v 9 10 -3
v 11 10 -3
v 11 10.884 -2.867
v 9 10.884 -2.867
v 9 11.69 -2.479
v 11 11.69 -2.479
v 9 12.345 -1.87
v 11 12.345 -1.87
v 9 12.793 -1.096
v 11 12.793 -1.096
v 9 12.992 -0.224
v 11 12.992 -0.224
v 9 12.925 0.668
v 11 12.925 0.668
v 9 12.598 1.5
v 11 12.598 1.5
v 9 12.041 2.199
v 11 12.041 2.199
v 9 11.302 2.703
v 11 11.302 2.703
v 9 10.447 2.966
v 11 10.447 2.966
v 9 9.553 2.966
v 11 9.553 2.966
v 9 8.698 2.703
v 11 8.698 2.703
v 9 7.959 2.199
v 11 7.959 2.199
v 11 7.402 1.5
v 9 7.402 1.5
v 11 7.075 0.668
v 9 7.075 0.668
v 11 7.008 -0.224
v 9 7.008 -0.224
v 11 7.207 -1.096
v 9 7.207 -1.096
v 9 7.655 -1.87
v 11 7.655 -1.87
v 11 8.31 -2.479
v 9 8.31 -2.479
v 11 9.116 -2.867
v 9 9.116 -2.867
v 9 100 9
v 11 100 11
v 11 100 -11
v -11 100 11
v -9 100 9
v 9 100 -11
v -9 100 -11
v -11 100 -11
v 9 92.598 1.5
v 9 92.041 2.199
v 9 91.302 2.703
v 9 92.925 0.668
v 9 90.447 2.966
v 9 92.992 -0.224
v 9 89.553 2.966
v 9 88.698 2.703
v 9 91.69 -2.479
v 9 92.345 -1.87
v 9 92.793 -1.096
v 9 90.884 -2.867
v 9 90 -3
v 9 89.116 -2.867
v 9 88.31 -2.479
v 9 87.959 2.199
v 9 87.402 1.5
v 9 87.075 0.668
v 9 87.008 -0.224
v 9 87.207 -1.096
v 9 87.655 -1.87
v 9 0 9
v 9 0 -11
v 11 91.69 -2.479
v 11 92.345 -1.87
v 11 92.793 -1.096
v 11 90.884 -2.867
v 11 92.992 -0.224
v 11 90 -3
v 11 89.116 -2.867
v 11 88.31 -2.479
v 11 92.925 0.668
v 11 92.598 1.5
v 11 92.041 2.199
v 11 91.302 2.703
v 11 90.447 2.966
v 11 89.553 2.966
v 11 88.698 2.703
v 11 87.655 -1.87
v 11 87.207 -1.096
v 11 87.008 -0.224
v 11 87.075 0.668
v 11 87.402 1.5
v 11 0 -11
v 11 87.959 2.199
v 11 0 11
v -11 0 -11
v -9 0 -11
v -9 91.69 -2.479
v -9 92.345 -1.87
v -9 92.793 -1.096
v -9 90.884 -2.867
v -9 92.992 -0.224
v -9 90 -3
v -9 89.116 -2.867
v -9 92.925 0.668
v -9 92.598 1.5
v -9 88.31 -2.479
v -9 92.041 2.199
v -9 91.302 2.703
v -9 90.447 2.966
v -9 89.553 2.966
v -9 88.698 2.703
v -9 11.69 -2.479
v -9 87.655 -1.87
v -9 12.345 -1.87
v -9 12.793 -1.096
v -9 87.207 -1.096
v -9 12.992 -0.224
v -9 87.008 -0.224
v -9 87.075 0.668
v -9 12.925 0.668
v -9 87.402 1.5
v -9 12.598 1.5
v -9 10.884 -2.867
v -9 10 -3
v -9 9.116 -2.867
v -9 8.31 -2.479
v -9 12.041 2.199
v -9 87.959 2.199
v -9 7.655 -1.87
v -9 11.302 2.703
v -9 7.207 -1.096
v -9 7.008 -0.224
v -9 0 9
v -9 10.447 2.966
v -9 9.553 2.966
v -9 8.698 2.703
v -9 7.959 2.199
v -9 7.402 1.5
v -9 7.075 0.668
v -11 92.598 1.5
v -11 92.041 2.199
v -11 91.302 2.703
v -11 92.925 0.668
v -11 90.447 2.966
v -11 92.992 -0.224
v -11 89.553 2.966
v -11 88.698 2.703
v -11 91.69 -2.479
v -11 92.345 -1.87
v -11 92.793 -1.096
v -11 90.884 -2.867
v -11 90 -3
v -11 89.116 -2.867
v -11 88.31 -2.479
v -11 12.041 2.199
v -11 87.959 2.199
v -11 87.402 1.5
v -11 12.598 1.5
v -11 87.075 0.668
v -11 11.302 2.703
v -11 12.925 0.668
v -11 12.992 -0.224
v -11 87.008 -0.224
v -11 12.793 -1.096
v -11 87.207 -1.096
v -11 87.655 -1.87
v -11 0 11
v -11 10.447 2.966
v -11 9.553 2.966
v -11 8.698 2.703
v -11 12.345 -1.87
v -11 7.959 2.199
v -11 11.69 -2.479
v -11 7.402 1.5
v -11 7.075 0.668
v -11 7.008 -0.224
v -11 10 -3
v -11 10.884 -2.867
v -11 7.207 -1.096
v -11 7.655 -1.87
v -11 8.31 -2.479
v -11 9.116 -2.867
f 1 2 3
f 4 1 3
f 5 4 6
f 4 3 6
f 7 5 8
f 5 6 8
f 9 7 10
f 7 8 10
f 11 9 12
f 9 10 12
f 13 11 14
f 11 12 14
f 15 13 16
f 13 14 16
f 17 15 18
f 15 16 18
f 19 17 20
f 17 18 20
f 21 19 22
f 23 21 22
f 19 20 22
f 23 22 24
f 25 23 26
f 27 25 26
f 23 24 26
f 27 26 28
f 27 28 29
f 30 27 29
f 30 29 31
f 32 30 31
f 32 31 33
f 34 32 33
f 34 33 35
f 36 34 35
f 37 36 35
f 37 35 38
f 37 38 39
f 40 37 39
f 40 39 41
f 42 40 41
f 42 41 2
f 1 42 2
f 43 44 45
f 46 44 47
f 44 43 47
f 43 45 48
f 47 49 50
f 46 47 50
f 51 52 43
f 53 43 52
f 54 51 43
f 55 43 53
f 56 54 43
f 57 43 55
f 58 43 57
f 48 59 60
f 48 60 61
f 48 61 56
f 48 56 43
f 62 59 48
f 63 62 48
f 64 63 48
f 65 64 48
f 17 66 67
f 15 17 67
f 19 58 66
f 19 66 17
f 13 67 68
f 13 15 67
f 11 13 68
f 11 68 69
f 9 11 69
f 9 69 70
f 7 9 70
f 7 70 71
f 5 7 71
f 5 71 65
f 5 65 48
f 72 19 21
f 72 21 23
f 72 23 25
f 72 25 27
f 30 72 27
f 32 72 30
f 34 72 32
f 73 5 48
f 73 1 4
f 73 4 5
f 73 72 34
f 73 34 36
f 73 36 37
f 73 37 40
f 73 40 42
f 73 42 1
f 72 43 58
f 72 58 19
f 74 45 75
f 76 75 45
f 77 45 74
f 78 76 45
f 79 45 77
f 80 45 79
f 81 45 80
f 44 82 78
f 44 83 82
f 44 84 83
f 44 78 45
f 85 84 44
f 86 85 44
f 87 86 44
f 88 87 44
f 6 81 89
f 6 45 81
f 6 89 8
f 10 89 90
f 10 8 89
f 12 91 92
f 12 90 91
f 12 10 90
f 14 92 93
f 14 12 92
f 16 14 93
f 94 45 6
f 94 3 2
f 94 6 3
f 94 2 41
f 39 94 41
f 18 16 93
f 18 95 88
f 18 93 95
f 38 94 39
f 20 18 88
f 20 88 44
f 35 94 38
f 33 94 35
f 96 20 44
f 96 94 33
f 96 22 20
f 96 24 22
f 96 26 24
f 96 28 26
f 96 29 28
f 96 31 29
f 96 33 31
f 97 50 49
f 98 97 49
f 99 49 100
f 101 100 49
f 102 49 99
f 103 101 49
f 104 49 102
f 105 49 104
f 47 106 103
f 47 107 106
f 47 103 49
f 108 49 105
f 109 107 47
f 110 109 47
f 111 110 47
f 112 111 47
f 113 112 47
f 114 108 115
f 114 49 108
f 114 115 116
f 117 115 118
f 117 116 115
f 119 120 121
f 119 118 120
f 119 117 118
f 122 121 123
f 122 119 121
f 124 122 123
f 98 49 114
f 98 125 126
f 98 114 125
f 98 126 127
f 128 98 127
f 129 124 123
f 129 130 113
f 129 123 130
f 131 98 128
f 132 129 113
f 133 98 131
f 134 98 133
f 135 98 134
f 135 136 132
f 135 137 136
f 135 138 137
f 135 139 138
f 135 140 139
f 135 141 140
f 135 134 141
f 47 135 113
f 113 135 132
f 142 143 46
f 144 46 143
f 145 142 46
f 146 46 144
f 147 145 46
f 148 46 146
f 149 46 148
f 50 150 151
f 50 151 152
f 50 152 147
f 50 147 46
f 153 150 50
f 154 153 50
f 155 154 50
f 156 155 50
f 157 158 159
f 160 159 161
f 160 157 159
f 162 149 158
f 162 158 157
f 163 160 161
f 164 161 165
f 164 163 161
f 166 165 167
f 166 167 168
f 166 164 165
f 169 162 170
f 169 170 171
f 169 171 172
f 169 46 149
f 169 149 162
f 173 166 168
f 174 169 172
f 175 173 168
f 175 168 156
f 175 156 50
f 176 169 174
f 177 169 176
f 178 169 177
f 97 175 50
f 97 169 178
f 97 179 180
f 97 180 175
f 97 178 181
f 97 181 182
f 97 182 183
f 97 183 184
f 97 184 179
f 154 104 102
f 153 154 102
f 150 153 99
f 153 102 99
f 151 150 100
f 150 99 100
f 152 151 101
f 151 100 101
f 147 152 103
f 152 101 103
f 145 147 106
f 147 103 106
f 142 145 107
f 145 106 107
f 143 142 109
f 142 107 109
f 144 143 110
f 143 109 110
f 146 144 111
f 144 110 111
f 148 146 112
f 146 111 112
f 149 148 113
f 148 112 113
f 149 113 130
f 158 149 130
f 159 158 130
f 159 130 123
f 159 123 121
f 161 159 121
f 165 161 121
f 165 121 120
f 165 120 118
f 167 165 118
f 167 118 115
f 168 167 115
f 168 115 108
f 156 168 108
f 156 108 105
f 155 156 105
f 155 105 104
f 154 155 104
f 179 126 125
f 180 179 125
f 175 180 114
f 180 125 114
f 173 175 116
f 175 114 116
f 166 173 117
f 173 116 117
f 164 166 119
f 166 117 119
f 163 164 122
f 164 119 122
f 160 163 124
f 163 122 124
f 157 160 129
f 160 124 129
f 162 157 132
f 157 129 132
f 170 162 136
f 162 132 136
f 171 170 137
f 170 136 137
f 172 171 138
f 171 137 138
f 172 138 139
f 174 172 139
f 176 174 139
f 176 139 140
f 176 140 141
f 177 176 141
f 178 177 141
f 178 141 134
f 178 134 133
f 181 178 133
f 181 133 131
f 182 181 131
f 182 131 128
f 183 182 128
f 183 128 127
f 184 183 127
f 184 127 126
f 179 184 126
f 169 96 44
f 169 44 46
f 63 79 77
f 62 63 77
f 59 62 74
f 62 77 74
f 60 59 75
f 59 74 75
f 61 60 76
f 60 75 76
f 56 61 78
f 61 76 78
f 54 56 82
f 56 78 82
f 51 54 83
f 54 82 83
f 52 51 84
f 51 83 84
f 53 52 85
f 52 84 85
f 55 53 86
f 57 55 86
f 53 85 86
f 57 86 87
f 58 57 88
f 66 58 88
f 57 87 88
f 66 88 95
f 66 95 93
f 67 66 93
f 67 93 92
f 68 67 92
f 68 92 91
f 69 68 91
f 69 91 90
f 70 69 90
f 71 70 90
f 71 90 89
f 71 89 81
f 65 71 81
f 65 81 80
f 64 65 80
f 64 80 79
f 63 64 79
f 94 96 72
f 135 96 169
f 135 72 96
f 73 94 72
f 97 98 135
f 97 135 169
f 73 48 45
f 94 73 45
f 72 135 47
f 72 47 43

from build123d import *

# Parameters (mm, degrees)
SALIENTE_EXTRUIR1_DEPTH = 100
CROQUIS2_R              = 3
CORTAR_EXTRUIR1_DEPTH   = 100
CROQUIS3_R              = 3
CORTAR_EXTRUIR2_DEPTH   = 103.980580694


with BuildPart() as part:
    # Croquis1 → Saliente-Extruir1 (new body)
    with BuildSketch(Plane(origin=(0, 0, 0), x_dir=(1, 0, 0), z_dir=(0, 1, 0))):
        Polygon((-9, 11), (-9, -9), (9, -9), (9, 11), (11, 11), (11, -11), (-11, -11), (-11, 11), align=None)
    extrude(amount=SALIENTE_EXTRUIR1_DEPTH)

    # Croquis2 → Cortar-Extruir1 (cut)
    with BuildSketch(Plane(origin=(11, 0, 0), x_dir=(0, 0, -1), z_dir=(1, 0, 0))):
        with Locations((0, 10)):
            Circle(CROQUIS2_R)
    extrude(amount=-CORTAR_EXTRUIR1_DEPTH, mode=Mode.SUBTRACT)

    # Croquis3 → Cortar-Extruir2 (cut, through all)
    with BuildSketch(Plane(origin=(11, 0, 0), x_dir=(0, 0, -1), z_dir=(1, 0, 0))):
        with Locations((0, 90)):
            Circle(CROQUIS3_R)
    extrude(amount=-CORTAR_EXTRUIR2_DEPTH, mode=Mode.SUBTRACT)


solid = part.part
